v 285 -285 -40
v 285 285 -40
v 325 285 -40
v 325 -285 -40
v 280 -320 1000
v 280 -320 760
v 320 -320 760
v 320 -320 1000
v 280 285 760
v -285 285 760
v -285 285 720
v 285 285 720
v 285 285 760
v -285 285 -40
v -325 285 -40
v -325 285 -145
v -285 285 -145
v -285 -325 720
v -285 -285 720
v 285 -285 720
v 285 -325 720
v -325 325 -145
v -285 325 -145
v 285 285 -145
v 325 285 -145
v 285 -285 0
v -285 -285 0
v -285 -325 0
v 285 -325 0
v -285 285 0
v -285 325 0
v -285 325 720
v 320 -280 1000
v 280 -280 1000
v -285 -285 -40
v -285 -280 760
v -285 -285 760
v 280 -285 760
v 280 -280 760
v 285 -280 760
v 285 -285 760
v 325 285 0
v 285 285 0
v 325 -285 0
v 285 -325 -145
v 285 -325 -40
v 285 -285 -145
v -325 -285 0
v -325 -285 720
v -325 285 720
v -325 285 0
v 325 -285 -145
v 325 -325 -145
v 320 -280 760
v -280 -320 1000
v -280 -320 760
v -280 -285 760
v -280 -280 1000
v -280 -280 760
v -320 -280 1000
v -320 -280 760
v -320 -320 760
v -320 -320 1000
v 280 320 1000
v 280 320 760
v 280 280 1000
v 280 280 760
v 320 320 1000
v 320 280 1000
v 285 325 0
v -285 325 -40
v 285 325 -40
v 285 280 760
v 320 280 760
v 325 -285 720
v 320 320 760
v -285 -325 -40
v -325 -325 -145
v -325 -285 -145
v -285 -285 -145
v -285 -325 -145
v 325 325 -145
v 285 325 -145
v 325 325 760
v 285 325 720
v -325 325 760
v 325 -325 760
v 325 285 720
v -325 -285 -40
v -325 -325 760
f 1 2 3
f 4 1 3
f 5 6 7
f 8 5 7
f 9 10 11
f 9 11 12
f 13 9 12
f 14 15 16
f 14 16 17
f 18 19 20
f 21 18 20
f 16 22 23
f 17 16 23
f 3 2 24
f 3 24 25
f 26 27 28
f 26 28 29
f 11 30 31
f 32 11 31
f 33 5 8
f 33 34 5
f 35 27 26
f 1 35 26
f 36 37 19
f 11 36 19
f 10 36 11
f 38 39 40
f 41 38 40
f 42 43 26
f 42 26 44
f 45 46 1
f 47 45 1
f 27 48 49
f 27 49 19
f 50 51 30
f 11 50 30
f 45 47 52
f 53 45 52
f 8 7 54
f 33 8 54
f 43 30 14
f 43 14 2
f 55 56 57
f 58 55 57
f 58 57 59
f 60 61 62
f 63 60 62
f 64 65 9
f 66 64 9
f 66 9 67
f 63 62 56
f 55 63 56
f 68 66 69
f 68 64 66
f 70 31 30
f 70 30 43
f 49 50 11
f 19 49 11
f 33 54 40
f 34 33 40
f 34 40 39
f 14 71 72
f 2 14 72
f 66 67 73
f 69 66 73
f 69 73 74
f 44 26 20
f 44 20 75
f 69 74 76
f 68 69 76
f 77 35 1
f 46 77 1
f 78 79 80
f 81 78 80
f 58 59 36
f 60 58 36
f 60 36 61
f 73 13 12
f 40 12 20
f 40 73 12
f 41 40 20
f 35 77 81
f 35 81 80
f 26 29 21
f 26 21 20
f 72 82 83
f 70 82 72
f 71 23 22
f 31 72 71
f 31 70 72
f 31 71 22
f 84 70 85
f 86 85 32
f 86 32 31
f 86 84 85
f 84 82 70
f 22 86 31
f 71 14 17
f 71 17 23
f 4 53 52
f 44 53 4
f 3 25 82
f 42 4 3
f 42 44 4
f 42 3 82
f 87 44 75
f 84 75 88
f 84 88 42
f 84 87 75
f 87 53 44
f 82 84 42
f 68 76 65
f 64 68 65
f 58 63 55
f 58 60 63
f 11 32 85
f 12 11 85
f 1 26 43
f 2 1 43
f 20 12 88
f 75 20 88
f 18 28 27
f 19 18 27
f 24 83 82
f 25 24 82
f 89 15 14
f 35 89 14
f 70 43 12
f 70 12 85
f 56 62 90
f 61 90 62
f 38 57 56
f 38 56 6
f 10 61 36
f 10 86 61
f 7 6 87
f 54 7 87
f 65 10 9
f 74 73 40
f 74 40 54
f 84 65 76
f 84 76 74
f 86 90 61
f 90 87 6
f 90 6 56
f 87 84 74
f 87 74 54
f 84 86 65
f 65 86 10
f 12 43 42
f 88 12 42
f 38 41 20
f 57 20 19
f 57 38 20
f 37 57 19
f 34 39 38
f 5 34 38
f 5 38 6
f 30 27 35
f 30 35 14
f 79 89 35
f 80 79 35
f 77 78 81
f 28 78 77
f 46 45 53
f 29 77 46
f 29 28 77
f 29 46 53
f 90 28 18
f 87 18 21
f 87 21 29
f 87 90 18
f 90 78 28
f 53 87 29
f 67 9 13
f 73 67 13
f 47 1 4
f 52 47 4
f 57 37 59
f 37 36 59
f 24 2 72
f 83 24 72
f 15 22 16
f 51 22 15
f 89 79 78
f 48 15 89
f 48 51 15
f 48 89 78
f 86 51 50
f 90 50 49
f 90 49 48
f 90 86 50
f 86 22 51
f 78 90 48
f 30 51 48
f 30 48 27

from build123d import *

# Parameters (mm, degrees)
F0_W          = 570
F0_H          = 40
F1_DEPTH      = 40
F0_W_2        = 40
F0_H_2        = 570
F2_DEPTH      = 760
F2_DEPTH_BACK = 145
F3_W          = 5
F3_H          = 35
F3_H_2        = 5
F3_W_2        = 35
F4_DEPTH      = 40
F5_DEPTH      = 240


with BuildPart() as f1:
    # F0 (on Top) → F1 (new body)
    with BuildSketch(Plane.XY):
        with Locations((0, 305)):
            Rectangle(F0_W, F0_H)
    extrude(amount=-F1_DEPTH)



with BuildPart() as f1b:
    # F0 (on Top) → F1, piece 2 (new body)
    with BuildSketch(Plane.XY):
        with Locations((-305, 0)):
            Rectangle(F0_W_2, F0_H_2)
    extrude(amount=-F1_DEPTH)


with BuildPart() as f1c:
    # F0 (on Top) → F1, piece 3 (new body)
    with BuildSketch(Plane.XY):
        with Locations((305, 0)):
            Rectangle(F0_W_2, F0_H_2)
    extrude(amount=-F1_DEPTH)


with BuildPart() as f1d:
    # F0 (on Top) → F1, piece 4 (new body)
    with BuildSketch(Plane.XY):
        with Locations((0, -305)):
            Rectangle(F0_W, F0_H)
    extrude(amount=-F1_DEPTH)


with BuildPart() as f1_1:
    add(f1.part)

    add(f1b.part)  # F2 merges F1b

    add(f1c.part)  # F2 merges F1c

    add(f1d.part)  # F2 merges F1d
    # F0 (on Top) → F2 (join, two sides)
    with BuildSketch(Plane.XY) as f2_sk:
        with Locations((-305, 305)):
            Rectangle(F0_W_2, F0_H)
        with Locations((305, 305)):
            Rectangle(F0_W_2, F0_H)
        with Locations((305, -305)):
            Rectangle(F0_W_2, F0_H)
        with Locations((-305, -305)):
            Rectangle(F0_W_2, F0_H)
    extrude(amount=F2_DEPTH)
    extrude(f2_sk.sketch, amount=-F2_DEPTH_BACK)

    # F3 (on face) → F4 (join)
    with BuildSketch(Plane.XY.offset(760)):
        Polygon((280, 320), (280, 325), (-280, 325), (-280, 320), (-280, 285), (280, 285), align=None)
        with Locations((-282.5, 302.5)):
            Rectangle(F3_W, F3_H)
        with Locations((-282.5, 322.5)):
            Rectangle(F3_W, F3_H_2)
        with Locations((-302.5, 282.5)):
            Rectangle(F3_W_2, F3_H_2)
        with Locations((-322.5, 282.5)):
            Rectangle(F3_W, F3_H_2)
        Polygon((-285, -280), (-285, 280), (-320, 280), (-325, 280), (-325, -280), (-320, -280), align=None)
        with Locations((282.5, 302.5)):
            Rectangle(F3_W, F3_H)
        with Locations((282.5, 322.5)):
            Rectangle(F3_W, F3_H_2)
        with Locations((302.5, 282.5)):
            Rectangle(F3_W_2, F3_H_2)
        with Locations((322.5, 282.5)):
            Rectangle(F3_W, F3_H_2)
        Polygon((325, -280), (325, 280), (320, 280), (285, 280), (285, -280), (320, -280), align=None)
        with Locations((302.5, -282.5)):
            Rectangle(F3_W_2, F3_H_2)
        with Locations((322.5, -282.5)):
            Rectangle(F3_W, F3_H_2)
        with Locations((282.5, -302.5)):
            Rectangle(F3_W, F3_H)
        with Locations((282.5, -322.5)):
            Rectangle(F3_W, F3_H_2)
        Polygon((280, -320), (280, -285), (-280, -285), (-280, -320), (-280, -325), (280, -325), align=None)
        with Locations((-282.5, -302.5)):
            Rectangle(F3_W, F3_H)
        with Locations((-282.5, -322.5)):
            Rectangle(F3_W, F3_H_2)
        with Locations((-302.5, -282.5)):
            Rectangle(F3_W_2, F3_H_2)
        with Locations((-322.5, -282.5)):
            Rectangle(F3_W, F3_H_2)
    extrude(amount=-F4_DEPTH)

    # F3 (on face) → F5 (join)
    with BuildSketch(Plane.XY.offset(760)):
        with Locations((302.5, -282.5)):
            Rectangle(F3_W_2, F3_H_2)
        with Locations((302.5, -302.5)):
            Rectangle(F3_W_2, F3_H)
        with Locations((282.5, -302.5)):
            Rectangle(F3_W, F3_H)
        with Locations((282.5, -282.5)):
            Rectangle(F3_W, F3_H_2)
        with Locations((302.5, 302.5)):
            Rectangle(F3_W_2, F3_H)
        with Locations((302.5, 282.5)):
            Rectangle(F3_W_2, F3_H_2)
        with Locations((282.5, 282.5)):
            Rectangle(F3_W, F3_H_2)
        with Locations((282.5, 302.5)):
            Rectangle(F3_W, F3_H)
        with Locations((-302.5, -302.5)):
            Rectangle(F3_W_2, F3_H)
        with Locations((-302.5, -282.5)):
            Rectangle(F3_W_2, F3_H_2)
        with Locations((-282.5, -282.5)):
            Rectangle(F3_W, F3_H_2)
        with Locations((-282.5, -302.5)):
            Rectangle(F3_W, F3_H)
    extrude(amount=F5_DEPTH)


solid = f1_1.part
